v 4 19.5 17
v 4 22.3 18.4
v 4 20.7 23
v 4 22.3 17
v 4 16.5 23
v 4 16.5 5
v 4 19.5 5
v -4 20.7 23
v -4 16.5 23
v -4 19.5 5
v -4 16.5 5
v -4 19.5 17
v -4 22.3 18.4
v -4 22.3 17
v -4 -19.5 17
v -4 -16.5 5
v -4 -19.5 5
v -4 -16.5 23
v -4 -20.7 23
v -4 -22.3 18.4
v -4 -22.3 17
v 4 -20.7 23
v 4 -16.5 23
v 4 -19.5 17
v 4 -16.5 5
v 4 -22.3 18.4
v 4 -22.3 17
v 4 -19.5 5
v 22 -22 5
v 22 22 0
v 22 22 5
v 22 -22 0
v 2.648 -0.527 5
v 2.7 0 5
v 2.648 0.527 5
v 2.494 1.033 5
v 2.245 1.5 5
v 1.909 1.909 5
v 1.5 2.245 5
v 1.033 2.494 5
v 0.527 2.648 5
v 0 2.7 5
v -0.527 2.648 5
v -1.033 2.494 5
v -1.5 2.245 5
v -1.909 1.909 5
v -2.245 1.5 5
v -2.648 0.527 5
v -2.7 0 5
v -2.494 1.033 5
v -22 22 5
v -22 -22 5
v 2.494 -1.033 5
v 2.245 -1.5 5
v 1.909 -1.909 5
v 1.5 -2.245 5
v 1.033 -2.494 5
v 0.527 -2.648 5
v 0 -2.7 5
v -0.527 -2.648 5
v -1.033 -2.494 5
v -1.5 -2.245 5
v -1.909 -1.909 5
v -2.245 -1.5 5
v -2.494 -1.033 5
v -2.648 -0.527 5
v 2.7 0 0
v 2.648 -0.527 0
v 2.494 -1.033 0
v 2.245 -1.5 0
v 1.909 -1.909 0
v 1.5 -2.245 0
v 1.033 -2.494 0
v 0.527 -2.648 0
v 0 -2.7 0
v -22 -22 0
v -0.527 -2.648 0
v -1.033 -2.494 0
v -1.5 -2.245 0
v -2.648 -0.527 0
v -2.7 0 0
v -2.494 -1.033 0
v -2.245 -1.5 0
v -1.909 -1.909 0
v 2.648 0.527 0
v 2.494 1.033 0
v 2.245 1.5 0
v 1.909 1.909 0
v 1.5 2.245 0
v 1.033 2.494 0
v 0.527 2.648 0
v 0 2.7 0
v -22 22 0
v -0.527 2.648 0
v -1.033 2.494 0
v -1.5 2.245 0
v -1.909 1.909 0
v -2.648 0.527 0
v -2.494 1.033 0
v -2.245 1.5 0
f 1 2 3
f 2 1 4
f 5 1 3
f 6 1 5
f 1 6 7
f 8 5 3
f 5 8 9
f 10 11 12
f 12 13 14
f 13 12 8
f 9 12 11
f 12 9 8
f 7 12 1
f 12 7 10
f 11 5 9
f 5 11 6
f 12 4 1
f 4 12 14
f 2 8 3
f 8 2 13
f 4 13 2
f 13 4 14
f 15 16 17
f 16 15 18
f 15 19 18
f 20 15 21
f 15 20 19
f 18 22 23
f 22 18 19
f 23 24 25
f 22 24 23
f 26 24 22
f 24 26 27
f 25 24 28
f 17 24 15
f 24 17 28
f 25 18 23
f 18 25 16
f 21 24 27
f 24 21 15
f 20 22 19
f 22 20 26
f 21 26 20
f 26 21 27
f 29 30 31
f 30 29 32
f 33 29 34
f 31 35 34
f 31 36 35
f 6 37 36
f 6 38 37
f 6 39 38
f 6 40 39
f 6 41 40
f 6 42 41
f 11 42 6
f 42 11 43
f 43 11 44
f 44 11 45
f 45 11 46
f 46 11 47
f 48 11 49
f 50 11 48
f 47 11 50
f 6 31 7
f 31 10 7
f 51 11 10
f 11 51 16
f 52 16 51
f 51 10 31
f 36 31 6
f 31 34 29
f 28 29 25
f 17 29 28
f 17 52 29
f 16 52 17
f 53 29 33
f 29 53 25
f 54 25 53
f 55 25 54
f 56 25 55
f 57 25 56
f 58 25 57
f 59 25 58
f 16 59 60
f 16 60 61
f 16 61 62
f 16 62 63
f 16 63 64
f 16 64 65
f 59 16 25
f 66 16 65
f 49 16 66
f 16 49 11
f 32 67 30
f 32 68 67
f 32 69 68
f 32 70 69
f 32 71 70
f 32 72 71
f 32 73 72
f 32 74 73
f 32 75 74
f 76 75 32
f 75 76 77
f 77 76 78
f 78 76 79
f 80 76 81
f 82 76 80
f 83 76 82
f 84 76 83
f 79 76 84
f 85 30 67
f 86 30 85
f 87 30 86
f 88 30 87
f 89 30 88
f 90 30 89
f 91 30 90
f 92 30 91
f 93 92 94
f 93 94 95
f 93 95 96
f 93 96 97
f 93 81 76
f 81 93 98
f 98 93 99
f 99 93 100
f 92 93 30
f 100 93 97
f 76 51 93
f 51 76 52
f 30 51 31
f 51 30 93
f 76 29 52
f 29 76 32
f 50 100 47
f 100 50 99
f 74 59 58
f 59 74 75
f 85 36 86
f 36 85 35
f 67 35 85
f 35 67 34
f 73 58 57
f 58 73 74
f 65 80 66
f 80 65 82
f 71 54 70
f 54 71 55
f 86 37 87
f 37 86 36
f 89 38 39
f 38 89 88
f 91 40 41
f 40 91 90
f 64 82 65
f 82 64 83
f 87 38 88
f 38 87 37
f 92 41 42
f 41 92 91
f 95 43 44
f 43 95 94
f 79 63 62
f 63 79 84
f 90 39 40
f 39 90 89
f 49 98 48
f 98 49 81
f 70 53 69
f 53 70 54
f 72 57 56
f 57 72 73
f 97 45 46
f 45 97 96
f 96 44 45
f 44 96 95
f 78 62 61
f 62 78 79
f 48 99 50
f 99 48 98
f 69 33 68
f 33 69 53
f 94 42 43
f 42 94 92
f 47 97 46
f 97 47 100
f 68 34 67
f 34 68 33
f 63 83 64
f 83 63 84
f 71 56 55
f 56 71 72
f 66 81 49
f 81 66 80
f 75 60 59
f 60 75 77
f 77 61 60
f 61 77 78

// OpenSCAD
$fn = 32;

// ----------------------------------------------------------------------
// Snap-fit latch: 2 arms, 18 mm tall, 3 mm undercut hooks
// ----------------------------------------------------------------------

// --- parameters (mm) ---
base_d = 44;              // base plate depth
base_h = 5;               // base plate thickness
span = 36;                // distance between opposite arms
arm_t = 3;                // arm thickness
arm_d = 8;                // arm width
height = 18;              // free arm length
head_len = 3;             // hook reach
head_h = 6;               // hook height
lead = 1.4;               // lead-in ramp thickness
bore_d = 5.4;             // base fixing bore
top_z = 23;               // height of the arm tips above the base

arms = 2;

difference() {
  union() {
    /* base plate, centred on the arm ring */
    translate([-22, -22, 0]) cube([base_d, base_d, base_h]);
    for (a = [0 : 360 / arms : 359]) rotate([0, 0, a]) {
    /* arm, sunk 0.5 mm into the base */
    translate([-arm_d / 2, span / 2 - arm_t / 2, base_h - 0.5]) cube([arm_d, arm_t, height + 0.5]);
    /* hook: a convex hull of a tall inner block and a thin outer lip
       gives a flat undercut below and a lead-in ramp on top */
    hull() {
      translate([-arm_d / 2, span / 2 + arm_t / 2 - 0.6, top_z - head_h]) cube([arm_d, lead + 0.4, head_h]);
      translate([-arm_d / 2, span / 2 + arm_t / 2 - 0.2, top_z - head_h]) cube([arm_d, head_len, lead]);
    }
    }
  }
  translate([0, 0, -2.5]) cylinder(h = base_h + 5, d = bore_d);
}
